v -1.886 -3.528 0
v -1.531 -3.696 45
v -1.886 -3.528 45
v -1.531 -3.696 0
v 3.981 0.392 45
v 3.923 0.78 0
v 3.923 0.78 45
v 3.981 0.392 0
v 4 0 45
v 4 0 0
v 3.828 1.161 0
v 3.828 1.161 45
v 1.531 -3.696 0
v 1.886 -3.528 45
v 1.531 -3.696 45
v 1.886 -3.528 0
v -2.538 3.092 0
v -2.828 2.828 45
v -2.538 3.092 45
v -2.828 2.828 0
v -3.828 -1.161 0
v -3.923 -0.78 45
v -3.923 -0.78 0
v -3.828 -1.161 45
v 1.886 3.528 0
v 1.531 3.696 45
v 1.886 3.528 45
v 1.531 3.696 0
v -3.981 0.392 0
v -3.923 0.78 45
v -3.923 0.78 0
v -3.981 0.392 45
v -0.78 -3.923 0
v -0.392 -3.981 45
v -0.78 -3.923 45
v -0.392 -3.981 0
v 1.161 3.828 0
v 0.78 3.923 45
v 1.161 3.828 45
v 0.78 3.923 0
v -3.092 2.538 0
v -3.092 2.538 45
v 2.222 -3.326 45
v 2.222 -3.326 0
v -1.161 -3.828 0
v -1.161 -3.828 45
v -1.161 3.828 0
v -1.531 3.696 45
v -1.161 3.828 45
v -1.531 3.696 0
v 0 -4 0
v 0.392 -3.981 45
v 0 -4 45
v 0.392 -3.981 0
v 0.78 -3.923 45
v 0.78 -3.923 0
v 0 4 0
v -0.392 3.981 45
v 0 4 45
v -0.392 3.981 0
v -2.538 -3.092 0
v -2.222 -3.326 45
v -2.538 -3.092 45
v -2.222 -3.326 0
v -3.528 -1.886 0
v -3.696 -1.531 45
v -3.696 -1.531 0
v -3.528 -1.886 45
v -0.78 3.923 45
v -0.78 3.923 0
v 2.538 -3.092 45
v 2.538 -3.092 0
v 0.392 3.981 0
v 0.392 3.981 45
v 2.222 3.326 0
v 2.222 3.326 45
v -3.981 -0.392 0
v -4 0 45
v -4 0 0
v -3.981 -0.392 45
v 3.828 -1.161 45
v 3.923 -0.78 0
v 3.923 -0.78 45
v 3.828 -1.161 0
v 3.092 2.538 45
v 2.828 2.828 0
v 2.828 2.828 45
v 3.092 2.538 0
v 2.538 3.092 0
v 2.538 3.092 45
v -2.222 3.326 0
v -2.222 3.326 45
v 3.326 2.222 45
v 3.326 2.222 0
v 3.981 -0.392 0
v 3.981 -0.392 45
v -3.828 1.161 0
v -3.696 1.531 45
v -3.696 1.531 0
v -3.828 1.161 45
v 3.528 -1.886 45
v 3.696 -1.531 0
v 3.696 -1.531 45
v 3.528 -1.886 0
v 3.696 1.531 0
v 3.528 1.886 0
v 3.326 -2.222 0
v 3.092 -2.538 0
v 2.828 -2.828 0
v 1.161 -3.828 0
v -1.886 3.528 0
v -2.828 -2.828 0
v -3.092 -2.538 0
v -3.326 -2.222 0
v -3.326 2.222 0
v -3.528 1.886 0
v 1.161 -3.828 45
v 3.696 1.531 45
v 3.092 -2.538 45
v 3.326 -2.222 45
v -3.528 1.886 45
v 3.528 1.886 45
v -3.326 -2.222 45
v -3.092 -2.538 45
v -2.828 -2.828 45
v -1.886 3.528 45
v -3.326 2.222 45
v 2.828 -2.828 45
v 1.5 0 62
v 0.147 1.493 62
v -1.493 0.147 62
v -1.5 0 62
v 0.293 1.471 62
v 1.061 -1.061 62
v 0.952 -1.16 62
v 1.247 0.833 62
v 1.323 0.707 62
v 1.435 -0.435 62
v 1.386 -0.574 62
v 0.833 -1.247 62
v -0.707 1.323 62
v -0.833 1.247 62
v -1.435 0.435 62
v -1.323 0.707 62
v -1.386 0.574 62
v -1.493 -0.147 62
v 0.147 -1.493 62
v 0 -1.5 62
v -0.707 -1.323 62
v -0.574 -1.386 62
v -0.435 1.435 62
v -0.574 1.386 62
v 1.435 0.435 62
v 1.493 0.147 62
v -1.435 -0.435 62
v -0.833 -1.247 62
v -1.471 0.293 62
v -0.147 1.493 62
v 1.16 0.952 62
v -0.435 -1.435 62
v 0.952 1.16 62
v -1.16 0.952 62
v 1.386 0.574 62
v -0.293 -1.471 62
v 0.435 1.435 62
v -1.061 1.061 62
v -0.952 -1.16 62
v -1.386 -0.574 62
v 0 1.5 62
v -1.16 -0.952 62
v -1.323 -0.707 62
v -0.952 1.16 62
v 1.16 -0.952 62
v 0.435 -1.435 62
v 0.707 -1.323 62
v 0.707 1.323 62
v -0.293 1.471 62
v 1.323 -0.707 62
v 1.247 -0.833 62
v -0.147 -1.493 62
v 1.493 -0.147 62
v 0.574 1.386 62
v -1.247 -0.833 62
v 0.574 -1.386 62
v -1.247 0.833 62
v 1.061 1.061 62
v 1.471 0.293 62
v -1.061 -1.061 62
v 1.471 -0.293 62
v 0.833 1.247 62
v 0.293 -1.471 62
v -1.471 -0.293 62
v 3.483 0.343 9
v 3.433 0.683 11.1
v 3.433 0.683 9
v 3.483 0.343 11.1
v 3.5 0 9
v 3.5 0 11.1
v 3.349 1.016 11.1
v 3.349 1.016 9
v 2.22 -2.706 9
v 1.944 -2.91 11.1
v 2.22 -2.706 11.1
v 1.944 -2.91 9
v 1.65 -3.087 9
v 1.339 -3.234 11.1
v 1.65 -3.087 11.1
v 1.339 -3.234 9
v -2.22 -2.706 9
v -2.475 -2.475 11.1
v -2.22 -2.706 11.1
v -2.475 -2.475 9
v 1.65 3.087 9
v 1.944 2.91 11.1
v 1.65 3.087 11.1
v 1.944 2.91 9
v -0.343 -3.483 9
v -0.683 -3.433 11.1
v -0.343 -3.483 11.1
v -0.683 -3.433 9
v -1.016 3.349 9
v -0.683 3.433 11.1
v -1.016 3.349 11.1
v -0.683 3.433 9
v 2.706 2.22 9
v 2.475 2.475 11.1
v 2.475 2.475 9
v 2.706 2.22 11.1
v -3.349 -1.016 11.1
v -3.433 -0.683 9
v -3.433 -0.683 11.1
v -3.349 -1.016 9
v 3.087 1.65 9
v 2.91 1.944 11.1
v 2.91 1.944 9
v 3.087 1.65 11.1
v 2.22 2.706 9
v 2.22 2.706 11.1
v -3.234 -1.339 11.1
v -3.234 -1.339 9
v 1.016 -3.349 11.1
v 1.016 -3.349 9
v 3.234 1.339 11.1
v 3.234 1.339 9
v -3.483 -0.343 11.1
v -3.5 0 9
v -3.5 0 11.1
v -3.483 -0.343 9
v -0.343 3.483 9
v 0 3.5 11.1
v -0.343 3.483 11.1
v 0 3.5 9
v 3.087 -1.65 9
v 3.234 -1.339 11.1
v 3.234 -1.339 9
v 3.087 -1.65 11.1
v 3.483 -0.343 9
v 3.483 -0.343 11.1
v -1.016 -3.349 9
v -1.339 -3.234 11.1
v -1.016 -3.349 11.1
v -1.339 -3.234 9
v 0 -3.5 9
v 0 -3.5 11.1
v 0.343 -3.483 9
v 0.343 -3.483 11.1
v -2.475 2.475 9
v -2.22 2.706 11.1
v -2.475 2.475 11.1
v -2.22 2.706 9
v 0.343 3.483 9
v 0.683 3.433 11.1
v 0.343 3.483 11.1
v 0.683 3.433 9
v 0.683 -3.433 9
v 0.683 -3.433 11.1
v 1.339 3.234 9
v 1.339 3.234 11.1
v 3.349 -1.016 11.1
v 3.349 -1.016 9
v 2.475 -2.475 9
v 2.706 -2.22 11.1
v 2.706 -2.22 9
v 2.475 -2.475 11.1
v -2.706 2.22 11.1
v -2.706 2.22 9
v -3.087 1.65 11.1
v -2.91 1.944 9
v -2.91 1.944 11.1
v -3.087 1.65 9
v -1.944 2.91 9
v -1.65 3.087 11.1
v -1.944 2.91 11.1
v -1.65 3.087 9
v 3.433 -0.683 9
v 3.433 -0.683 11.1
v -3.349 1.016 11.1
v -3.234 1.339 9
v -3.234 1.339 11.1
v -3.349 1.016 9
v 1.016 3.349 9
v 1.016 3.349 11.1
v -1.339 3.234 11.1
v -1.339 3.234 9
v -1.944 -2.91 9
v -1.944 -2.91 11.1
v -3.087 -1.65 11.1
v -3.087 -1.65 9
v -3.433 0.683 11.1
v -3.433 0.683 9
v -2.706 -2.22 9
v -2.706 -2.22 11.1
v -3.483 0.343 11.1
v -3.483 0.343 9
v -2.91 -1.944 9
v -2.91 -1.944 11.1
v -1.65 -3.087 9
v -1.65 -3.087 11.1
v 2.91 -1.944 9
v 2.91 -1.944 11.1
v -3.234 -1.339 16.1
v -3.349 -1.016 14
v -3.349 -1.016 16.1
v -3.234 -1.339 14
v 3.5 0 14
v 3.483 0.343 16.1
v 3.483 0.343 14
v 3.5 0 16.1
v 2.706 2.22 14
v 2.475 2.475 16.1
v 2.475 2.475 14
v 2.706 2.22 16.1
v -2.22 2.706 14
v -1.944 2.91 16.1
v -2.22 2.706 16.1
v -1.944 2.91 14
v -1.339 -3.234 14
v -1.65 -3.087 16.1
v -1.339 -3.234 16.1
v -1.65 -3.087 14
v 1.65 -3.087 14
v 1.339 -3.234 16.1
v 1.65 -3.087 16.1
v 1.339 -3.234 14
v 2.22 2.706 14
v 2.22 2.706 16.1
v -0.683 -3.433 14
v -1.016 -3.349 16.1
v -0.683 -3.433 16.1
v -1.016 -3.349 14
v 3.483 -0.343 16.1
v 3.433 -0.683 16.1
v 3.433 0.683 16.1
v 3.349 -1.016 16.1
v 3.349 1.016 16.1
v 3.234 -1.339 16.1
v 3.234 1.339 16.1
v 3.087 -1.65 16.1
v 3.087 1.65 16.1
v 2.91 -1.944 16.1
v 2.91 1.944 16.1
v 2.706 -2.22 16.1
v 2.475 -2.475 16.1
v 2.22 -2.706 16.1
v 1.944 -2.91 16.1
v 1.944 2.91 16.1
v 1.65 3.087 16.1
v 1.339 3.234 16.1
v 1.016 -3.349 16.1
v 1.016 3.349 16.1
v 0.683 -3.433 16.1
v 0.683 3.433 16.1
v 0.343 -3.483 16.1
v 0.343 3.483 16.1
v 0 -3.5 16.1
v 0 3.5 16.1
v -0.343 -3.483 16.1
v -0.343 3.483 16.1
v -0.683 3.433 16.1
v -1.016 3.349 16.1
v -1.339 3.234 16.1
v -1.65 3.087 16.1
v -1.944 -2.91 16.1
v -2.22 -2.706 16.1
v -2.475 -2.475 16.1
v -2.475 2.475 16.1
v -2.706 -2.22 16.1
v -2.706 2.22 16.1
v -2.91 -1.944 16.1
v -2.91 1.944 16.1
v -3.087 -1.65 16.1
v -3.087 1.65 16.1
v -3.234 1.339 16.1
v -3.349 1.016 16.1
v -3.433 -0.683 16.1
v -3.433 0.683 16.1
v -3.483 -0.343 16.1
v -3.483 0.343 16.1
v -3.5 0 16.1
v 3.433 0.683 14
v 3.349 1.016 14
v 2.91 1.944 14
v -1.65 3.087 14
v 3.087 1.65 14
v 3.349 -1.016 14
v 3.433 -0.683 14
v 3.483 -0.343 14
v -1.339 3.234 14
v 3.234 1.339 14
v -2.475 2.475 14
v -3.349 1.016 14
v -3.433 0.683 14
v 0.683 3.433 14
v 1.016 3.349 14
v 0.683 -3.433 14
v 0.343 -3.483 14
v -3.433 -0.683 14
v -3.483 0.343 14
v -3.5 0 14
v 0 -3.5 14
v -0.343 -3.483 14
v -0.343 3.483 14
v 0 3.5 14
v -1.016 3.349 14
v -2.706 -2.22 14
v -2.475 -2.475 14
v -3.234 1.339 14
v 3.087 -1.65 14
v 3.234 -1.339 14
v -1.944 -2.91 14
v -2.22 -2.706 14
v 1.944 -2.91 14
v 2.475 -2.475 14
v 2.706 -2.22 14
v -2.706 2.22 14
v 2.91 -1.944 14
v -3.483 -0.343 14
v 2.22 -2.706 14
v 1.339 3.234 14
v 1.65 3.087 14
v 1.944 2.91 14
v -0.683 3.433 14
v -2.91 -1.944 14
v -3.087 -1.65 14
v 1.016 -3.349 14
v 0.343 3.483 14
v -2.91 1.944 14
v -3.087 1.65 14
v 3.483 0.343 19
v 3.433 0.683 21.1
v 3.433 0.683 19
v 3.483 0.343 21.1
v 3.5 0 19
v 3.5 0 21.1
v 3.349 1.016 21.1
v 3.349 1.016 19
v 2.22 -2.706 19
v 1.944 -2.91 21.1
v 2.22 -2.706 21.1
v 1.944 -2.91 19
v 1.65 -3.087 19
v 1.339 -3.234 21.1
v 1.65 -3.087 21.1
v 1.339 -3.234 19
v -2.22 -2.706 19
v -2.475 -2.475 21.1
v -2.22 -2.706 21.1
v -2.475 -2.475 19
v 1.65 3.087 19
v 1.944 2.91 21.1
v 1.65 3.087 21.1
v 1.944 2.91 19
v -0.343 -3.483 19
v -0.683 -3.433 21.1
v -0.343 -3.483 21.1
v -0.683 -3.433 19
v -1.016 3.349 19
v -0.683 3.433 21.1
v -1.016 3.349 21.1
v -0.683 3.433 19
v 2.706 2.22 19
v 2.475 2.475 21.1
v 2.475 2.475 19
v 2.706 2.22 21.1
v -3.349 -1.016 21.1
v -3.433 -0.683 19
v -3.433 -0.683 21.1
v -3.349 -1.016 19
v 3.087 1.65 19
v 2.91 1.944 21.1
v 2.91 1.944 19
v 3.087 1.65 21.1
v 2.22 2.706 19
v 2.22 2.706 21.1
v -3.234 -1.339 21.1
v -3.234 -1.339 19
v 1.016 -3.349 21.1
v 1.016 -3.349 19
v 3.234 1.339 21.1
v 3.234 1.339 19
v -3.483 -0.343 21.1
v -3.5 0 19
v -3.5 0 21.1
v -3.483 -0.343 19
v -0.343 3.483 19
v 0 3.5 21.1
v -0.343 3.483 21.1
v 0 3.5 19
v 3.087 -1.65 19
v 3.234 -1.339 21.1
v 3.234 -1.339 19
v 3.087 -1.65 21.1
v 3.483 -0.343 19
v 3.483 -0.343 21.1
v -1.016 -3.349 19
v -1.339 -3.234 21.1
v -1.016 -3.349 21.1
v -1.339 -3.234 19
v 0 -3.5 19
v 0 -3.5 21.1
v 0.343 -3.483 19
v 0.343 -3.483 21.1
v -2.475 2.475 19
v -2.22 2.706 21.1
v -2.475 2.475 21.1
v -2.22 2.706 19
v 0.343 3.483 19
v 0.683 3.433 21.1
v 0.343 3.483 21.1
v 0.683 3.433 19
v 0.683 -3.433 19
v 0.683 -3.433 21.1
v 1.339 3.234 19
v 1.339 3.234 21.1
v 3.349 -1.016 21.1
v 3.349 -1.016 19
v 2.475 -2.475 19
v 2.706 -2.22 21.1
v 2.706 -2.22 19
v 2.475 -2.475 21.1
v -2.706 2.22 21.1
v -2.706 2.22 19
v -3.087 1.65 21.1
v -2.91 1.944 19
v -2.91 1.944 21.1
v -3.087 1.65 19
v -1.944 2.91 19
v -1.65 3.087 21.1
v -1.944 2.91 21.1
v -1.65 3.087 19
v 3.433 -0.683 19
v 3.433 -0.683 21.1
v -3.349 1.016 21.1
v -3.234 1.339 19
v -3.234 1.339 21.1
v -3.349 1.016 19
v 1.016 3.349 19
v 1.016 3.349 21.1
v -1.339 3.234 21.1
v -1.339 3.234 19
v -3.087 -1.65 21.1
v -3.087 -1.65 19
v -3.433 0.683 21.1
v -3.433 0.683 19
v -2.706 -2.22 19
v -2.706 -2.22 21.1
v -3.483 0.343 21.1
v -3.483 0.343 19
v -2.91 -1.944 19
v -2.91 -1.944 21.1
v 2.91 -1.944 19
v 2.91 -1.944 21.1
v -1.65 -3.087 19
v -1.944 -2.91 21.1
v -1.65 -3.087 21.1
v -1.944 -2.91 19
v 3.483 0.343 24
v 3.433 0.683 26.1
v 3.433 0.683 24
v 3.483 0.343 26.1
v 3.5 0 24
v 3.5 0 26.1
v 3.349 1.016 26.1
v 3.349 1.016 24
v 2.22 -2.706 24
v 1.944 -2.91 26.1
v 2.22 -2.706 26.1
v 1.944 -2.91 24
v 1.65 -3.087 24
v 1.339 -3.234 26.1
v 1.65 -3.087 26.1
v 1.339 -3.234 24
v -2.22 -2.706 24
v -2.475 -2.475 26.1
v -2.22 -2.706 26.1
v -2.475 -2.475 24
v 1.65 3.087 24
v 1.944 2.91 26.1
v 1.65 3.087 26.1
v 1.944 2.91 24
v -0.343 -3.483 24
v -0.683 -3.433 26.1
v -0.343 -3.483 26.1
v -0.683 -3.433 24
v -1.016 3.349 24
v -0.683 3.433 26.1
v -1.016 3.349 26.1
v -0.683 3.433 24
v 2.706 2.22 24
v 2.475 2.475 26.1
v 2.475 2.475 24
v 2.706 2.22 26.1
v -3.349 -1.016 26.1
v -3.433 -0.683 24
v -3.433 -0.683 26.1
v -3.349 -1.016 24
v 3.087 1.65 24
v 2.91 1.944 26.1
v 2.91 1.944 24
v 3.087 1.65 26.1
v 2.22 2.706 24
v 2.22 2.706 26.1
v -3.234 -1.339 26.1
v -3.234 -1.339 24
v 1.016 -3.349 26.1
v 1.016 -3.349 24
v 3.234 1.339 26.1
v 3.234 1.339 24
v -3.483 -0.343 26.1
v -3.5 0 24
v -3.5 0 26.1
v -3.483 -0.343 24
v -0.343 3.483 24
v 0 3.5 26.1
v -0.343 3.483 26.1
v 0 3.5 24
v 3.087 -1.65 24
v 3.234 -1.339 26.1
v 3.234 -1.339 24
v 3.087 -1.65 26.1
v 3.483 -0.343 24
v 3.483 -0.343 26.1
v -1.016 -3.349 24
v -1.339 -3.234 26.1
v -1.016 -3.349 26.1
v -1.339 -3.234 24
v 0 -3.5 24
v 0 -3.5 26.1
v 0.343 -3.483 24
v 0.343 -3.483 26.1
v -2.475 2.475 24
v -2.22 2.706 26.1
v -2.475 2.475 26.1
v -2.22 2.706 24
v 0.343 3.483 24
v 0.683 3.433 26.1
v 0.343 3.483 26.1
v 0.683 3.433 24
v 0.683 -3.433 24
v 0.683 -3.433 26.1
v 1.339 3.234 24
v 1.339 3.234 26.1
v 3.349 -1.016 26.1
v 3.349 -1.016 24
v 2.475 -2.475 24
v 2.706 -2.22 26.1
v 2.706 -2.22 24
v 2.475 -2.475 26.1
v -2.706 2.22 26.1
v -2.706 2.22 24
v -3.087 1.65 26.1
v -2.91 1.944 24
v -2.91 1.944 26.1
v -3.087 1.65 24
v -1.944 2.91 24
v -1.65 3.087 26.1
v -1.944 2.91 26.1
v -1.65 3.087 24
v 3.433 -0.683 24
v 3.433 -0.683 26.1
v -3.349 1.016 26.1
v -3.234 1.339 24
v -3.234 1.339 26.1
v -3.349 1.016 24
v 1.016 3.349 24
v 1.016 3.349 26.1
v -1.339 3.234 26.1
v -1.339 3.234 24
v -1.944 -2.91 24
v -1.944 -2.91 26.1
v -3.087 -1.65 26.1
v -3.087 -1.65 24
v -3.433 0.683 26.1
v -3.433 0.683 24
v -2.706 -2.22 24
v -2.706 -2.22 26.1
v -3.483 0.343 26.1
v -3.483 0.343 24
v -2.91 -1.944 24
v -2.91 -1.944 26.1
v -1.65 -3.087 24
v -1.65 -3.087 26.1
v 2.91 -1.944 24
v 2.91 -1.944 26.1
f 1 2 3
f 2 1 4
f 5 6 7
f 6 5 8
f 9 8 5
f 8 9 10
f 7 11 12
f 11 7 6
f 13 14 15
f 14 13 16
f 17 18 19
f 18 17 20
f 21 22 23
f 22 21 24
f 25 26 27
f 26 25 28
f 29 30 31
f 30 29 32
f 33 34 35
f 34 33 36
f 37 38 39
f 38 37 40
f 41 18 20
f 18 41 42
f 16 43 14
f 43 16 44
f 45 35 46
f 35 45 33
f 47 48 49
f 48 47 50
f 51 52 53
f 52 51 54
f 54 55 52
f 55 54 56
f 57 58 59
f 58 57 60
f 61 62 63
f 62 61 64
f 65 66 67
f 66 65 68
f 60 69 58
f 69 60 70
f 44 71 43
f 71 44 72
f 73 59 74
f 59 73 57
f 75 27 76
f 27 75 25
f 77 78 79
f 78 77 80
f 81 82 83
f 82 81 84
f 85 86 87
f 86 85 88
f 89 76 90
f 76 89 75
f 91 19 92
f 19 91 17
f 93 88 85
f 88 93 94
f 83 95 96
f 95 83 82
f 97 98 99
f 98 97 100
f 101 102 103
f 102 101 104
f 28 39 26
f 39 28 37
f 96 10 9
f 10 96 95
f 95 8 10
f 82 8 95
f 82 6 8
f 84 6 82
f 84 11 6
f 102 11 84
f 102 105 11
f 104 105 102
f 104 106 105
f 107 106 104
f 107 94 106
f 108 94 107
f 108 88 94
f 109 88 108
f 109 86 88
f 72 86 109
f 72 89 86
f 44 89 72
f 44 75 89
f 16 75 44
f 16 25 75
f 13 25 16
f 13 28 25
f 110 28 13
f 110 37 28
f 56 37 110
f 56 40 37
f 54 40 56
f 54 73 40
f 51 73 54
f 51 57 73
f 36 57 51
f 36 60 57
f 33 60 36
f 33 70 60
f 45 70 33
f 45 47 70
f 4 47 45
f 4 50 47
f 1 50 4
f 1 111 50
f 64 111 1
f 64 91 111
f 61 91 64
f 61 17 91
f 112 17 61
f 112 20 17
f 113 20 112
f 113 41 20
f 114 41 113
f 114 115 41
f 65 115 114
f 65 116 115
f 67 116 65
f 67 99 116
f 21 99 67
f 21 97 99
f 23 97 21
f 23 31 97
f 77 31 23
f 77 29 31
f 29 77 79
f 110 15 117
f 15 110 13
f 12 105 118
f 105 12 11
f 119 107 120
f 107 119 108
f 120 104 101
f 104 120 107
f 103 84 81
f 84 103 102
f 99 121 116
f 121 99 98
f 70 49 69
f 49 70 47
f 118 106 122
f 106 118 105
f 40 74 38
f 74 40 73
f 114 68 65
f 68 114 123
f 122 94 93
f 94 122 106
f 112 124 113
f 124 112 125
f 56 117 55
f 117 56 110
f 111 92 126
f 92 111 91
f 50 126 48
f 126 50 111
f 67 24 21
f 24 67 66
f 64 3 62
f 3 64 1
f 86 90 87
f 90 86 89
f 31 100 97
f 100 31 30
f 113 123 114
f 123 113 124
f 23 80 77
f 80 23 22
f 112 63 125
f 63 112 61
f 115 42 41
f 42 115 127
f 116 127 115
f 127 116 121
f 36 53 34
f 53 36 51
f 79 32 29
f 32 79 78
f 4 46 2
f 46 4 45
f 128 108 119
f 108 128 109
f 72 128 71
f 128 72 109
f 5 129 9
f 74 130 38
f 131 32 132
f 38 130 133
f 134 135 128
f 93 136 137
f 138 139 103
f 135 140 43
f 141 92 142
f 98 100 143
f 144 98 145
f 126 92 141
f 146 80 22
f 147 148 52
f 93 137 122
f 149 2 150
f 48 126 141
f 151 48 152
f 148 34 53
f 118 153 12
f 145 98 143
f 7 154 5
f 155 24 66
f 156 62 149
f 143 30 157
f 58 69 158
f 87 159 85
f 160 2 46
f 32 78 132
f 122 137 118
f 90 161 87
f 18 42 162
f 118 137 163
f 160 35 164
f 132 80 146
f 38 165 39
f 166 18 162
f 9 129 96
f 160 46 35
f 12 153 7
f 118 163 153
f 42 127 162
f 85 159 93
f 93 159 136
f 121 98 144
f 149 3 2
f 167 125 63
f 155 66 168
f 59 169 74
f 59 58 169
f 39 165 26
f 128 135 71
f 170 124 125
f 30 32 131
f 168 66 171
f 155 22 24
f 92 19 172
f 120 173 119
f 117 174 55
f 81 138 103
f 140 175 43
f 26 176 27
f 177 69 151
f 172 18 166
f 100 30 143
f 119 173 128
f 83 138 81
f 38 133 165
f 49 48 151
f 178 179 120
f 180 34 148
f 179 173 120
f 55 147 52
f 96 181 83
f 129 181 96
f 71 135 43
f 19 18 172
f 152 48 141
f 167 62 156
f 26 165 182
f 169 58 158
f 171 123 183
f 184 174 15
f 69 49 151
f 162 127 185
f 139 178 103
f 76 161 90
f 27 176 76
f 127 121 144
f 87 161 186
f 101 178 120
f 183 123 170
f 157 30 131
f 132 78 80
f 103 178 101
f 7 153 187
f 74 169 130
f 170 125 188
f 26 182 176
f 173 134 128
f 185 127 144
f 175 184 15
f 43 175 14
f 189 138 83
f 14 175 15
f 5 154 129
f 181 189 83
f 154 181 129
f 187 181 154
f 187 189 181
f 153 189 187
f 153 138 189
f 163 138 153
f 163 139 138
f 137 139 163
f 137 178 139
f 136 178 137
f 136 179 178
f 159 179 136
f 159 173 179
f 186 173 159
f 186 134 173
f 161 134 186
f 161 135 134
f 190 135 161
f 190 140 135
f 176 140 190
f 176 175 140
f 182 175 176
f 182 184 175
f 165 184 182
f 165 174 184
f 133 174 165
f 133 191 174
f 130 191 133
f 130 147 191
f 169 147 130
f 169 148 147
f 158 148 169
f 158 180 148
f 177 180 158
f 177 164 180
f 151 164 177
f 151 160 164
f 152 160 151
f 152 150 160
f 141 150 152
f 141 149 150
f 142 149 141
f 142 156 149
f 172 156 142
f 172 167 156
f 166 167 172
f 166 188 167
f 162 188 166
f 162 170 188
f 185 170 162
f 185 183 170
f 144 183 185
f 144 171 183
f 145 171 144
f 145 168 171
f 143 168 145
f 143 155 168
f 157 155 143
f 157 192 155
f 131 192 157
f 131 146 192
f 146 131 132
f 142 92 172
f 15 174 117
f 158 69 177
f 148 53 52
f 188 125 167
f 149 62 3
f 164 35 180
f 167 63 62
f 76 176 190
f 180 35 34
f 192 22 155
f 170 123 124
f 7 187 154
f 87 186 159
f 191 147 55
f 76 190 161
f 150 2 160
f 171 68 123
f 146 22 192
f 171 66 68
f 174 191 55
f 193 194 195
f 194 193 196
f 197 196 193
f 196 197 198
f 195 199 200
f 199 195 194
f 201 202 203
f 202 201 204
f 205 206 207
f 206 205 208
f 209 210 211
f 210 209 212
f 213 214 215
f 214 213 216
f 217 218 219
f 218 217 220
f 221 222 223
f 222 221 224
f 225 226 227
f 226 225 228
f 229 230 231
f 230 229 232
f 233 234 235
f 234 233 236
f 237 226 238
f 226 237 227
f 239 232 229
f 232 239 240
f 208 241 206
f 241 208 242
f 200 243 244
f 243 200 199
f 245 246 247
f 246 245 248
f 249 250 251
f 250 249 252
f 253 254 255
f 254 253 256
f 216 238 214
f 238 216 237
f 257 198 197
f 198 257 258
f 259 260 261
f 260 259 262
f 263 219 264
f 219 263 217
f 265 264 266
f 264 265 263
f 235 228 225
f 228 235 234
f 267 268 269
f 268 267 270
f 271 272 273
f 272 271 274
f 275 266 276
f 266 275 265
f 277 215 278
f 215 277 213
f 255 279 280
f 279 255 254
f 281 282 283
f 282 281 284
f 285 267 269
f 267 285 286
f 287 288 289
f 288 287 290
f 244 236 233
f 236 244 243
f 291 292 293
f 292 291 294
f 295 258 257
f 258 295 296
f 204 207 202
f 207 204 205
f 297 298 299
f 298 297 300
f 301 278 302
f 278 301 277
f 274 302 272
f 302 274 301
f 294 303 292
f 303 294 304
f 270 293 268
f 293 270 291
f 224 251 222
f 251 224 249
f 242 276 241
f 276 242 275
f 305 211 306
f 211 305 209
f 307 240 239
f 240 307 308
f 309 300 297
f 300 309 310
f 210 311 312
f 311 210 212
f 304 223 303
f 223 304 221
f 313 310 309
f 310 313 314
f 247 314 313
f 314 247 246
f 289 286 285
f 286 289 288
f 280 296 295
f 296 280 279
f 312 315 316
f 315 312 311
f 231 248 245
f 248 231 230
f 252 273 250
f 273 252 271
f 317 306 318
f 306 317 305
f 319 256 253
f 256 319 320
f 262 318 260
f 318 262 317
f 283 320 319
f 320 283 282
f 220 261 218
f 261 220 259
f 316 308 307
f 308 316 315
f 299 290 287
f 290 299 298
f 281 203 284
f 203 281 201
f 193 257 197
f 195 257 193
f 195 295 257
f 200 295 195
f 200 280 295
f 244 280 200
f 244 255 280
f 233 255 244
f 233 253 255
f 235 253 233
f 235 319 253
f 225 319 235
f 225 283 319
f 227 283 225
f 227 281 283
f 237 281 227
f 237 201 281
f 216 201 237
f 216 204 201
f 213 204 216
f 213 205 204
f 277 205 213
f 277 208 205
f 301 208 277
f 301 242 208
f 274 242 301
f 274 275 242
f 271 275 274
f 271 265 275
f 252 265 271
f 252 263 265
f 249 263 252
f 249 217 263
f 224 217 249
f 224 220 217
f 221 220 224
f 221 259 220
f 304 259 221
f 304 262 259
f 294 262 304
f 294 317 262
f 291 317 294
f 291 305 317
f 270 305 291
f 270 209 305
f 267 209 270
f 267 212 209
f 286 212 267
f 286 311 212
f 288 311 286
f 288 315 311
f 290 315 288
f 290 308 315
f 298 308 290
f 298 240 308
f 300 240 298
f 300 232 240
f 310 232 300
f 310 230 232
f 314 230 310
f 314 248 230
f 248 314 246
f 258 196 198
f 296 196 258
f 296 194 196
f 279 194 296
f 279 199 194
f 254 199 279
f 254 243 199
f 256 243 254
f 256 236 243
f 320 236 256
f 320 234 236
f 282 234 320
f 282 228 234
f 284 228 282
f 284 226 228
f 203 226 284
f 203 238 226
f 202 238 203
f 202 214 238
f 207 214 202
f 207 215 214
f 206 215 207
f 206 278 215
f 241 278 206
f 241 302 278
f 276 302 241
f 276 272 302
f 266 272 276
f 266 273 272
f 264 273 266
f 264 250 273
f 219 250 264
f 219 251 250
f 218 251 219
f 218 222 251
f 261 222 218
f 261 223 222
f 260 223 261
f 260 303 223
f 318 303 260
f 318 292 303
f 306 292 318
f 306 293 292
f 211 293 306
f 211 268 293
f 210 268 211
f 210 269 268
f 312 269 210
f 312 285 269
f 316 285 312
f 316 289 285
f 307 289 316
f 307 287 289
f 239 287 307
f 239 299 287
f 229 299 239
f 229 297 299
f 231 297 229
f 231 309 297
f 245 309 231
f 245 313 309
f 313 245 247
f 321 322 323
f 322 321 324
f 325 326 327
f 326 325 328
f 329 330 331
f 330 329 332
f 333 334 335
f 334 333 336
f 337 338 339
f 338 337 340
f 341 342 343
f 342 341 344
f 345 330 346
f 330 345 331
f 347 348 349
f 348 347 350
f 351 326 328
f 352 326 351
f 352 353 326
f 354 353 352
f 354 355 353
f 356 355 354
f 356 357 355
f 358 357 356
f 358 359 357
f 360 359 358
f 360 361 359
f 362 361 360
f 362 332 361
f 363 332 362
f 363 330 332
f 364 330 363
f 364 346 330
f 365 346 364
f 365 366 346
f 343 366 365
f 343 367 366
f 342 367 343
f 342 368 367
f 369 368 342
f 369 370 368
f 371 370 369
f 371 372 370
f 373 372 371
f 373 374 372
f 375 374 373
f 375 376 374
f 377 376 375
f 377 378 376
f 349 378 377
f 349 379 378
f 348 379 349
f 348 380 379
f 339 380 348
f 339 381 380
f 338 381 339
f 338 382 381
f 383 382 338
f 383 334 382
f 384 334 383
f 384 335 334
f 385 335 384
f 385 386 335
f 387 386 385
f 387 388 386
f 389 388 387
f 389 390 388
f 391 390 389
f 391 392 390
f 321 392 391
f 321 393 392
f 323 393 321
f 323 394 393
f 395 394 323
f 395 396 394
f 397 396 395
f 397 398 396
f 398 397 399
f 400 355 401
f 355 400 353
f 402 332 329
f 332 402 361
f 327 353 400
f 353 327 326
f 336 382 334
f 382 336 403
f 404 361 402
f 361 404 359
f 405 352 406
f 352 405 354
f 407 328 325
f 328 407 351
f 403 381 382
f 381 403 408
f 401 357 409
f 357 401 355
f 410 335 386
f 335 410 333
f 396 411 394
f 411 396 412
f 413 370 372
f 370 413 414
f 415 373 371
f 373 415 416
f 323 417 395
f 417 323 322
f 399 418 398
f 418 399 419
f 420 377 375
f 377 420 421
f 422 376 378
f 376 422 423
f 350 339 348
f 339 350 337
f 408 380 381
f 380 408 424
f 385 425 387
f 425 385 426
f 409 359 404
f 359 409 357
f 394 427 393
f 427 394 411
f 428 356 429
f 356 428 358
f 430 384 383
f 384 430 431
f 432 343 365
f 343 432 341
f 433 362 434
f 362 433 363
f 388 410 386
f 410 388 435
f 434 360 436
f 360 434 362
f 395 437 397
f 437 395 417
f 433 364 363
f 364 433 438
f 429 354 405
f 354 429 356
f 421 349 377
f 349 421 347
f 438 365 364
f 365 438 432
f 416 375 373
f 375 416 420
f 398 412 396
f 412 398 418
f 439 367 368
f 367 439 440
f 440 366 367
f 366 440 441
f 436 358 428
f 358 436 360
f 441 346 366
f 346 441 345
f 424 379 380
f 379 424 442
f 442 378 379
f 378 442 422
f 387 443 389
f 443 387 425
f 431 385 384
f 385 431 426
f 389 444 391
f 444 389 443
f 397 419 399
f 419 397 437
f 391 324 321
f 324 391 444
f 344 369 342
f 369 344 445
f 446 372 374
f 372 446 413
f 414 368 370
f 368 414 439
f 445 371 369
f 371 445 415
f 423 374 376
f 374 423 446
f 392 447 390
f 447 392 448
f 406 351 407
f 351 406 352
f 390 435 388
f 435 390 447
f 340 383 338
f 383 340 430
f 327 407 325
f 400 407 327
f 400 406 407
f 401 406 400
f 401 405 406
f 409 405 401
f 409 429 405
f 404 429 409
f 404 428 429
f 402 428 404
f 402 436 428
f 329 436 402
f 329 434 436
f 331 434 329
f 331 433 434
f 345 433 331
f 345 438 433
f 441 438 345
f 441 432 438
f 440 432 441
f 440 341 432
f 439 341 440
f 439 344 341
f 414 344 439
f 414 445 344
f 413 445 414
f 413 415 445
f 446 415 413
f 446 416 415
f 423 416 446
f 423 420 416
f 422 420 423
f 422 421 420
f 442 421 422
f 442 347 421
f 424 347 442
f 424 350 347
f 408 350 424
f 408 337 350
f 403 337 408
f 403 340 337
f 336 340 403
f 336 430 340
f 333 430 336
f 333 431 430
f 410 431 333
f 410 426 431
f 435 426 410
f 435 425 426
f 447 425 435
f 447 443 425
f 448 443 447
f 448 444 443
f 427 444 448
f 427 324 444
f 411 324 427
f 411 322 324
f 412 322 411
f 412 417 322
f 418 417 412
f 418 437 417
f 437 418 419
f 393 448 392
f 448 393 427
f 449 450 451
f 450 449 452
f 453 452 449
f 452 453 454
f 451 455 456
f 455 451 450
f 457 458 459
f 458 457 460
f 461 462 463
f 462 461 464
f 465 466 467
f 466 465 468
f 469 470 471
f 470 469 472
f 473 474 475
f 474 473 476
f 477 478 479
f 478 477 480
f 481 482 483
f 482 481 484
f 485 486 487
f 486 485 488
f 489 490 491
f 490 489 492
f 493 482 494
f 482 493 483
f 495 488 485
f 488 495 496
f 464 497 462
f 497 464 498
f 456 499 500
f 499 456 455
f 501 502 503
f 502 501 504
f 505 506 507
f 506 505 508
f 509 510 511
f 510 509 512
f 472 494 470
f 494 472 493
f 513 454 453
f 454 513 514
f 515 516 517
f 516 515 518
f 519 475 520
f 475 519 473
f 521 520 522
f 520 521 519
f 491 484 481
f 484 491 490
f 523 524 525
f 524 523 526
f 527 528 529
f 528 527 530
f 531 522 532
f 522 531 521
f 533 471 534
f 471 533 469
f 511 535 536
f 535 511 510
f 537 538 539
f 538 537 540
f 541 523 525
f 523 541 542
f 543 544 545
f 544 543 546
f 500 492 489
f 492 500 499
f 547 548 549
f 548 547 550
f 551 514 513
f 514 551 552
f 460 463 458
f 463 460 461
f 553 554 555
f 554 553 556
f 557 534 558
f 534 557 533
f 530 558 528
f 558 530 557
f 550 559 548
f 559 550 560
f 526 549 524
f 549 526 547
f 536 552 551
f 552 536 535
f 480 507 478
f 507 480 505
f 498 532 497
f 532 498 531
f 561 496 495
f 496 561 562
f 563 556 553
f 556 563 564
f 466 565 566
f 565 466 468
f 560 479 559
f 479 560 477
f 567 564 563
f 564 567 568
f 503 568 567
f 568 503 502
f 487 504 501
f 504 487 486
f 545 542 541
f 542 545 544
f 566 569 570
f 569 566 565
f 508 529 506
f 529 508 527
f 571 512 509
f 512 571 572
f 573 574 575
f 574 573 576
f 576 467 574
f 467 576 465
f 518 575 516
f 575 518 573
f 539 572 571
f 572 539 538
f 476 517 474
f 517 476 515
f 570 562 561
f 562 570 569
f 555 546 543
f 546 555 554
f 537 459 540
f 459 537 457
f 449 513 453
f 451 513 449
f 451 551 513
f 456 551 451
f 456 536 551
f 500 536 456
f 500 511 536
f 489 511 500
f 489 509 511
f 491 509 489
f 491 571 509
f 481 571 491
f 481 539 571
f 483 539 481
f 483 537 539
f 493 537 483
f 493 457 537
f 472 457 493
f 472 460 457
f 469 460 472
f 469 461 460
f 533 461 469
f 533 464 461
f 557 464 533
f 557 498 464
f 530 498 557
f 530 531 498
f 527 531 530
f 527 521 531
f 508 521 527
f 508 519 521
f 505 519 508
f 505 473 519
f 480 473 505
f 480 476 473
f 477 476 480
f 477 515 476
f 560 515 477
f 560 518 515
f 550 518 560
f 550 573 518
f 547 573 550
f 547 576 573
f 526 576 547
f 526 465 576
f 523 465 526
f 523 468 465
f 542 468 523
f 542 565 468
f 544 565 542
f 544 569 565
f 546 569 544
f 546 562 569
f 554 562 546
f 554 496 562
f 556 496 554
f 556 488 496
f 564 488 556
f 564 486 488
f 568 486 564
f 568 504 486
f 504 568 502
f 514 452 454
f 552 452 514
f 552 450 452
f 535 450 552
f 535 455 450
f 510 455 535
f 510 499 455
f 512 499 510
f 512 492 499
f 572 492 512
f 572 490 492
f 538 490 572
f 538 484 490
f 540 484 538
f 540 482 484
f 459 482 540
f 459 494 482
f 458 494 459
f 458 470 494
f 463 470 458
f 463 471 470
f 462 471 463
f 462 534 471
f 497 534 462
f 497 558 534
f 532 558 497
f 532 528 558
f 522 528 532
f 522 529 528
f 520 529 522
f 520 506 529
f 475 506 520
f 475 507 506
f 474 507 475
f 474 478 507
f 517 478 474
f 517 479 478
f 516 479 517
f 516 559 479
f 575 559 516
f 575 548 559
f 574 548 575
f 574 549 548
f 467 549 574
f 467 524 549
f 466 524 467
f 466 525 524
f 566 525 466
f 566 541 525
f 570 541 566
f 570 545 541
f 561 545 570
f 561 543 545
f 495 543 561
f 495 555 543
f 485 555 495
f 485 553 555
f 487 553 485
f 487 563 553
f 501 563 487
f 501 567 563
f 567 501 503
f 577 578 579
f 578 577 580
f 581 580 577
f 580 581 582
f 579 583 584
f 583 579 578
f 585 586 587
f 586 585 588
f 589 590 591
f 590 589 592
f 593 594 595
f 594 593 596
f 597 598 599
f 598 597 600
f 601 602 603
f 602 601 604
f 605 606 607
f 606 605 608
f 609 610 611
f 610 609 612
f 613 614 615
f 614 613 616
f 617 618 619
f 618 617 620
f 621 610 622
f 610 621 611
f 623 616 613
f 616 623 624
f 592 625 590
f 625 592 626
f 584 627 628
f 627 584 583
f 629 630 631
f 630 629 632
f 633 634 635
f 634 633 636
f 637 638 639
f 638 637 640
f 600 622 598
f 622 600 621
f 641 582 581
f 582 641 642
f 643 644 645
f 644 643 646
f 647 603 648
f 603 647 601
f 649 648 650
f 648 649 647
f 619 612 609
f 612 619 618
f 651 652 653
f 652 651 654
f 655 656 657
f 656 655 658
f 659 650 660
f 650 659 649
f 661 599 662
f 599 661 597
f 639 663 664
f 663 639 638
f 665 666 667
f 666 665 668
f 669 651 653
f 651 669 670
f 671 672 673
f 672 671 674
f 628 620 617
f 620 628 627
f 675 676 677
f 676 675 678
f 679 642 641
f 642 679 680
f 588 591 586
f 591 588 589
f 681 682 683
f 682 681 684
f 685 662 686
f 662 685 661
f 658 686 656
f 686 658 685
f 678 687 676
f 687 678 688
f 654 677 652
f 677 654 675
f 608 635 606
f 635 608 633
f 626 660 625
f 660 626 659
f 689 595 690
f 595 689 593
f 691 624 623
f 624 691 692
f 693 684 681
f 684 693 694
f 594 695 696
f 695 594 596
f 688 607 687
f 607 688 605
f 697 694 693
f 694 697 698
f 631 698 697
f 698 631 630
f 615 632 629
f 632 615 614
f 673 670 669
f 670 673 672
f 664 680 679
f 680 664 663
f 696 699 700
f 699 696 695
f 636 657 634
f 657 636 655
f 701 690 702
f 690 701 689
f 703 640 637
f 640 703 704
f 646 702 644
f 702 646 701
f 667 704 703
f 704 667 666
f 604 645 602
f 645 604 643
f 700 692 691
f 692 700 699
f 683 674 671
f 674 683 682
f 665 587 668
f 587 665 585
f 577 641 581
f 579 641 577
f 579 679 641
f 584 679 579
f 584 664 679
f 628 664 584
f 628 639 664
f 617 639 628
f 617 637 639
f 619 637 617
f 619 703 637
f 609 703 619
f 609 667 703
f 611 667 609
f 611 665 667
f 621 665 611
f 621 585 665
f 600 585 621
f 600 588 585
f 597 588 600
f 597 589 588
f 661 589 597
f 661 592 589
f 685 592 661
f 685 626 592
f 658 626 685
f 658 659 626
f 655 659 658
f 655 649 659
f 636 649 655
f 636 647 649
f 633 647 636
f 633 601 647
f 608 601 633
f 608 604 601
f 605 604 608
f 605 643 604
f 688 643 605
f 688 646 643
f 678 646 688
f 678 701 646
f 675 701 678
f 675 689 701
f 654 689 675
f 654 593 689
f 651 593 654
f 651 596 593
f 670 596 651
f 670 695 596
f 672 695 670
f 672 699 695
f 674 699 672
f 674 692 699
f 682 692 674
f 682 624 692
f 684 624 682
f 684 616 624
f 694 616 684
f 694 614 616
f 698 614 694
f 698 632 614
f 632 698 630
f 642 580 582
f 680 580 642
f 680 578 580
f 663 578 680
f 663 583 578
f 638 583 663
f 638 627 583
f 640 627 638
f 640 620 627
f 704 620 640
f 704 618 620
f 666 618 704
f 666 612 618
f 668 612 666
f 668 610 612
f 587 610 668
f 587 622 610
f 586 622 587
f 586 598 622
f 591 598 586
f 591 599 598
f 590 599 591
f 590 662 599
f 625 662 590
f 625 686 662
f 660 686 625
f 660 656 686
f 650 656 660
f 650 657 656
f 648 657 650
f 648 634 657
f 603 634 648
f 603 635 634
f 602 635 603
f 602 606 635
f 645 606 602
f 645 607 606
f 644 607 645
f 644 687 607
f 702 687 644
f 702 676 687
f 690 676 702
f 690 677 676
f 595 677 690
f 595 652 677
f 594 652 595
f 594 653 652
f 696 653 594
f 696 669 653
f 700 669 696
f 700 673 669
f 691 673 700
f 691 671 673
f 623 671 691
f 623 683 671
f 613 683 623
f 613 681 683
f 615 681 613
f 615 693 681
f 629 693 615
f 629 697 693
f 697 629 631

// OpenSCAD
// Pestle for 1.5 mL microcentrifuge tube - printed standing upright.
// Dimensions in mm.

// Handle
h_d      = 8;      // Handle diameter
h_start  = 0;      // Handle start Z
h_end    = 45;     // Handle end Z

// Cone
c_d_top  = 8;      // Cone top diameter (at z=45)
c_d_bot  = 3;      // Cone bottom diameter (at z=62)
c_start  = 45;     // Cone start Z
c_end    = 62;     // Cone end Z

// Tip
tip_d    = 3;      // Tip diameter
tip_c    = 62;     // Tip center Z

// Grooves
g_count  = 4;      // Number of grooves
g_z      = [10, 15, 20, 25]; // Z positions of groove centers
g_w      = 2;      // Groove width (Z)
g_d      = 1;      // Groove depth

$fn = 64;

// Main body: Handle + Cone + Tip
difference() {
    union() {
        // 1. Cylindrical Handle
        translate([0, 0, h_start])
            cylinder(h = h_end - h_start, d = h_d);

        // 2. Cone (tapering from 8mm to 3mm)
        translate([0, 0, c_start])
            cylinder(h = c_end - c_start, d1 = c_d_top, d2 = c_d_bot);

        // 3. Rounded Tip (Sphere centered at z=62)
        translate([0, 0, tip_c - tip_d / 2])
            sphere(r = tip_d / 2);
    }

    // 4. Grooves (cut into the handle)
    // We cut a cylinder through the handle at each Z position.
    // The cylinder must extend slightly past the handle top/bottom to ensure clean cuts.
    for (i = [0 : g_count - 1]) {
        z_pos = g_z[i];
        translate([0, 0, z_pos - g_w / 2])
            cylinder(h = g_w + 0.1, d = h_d - g_d);
    }
}
